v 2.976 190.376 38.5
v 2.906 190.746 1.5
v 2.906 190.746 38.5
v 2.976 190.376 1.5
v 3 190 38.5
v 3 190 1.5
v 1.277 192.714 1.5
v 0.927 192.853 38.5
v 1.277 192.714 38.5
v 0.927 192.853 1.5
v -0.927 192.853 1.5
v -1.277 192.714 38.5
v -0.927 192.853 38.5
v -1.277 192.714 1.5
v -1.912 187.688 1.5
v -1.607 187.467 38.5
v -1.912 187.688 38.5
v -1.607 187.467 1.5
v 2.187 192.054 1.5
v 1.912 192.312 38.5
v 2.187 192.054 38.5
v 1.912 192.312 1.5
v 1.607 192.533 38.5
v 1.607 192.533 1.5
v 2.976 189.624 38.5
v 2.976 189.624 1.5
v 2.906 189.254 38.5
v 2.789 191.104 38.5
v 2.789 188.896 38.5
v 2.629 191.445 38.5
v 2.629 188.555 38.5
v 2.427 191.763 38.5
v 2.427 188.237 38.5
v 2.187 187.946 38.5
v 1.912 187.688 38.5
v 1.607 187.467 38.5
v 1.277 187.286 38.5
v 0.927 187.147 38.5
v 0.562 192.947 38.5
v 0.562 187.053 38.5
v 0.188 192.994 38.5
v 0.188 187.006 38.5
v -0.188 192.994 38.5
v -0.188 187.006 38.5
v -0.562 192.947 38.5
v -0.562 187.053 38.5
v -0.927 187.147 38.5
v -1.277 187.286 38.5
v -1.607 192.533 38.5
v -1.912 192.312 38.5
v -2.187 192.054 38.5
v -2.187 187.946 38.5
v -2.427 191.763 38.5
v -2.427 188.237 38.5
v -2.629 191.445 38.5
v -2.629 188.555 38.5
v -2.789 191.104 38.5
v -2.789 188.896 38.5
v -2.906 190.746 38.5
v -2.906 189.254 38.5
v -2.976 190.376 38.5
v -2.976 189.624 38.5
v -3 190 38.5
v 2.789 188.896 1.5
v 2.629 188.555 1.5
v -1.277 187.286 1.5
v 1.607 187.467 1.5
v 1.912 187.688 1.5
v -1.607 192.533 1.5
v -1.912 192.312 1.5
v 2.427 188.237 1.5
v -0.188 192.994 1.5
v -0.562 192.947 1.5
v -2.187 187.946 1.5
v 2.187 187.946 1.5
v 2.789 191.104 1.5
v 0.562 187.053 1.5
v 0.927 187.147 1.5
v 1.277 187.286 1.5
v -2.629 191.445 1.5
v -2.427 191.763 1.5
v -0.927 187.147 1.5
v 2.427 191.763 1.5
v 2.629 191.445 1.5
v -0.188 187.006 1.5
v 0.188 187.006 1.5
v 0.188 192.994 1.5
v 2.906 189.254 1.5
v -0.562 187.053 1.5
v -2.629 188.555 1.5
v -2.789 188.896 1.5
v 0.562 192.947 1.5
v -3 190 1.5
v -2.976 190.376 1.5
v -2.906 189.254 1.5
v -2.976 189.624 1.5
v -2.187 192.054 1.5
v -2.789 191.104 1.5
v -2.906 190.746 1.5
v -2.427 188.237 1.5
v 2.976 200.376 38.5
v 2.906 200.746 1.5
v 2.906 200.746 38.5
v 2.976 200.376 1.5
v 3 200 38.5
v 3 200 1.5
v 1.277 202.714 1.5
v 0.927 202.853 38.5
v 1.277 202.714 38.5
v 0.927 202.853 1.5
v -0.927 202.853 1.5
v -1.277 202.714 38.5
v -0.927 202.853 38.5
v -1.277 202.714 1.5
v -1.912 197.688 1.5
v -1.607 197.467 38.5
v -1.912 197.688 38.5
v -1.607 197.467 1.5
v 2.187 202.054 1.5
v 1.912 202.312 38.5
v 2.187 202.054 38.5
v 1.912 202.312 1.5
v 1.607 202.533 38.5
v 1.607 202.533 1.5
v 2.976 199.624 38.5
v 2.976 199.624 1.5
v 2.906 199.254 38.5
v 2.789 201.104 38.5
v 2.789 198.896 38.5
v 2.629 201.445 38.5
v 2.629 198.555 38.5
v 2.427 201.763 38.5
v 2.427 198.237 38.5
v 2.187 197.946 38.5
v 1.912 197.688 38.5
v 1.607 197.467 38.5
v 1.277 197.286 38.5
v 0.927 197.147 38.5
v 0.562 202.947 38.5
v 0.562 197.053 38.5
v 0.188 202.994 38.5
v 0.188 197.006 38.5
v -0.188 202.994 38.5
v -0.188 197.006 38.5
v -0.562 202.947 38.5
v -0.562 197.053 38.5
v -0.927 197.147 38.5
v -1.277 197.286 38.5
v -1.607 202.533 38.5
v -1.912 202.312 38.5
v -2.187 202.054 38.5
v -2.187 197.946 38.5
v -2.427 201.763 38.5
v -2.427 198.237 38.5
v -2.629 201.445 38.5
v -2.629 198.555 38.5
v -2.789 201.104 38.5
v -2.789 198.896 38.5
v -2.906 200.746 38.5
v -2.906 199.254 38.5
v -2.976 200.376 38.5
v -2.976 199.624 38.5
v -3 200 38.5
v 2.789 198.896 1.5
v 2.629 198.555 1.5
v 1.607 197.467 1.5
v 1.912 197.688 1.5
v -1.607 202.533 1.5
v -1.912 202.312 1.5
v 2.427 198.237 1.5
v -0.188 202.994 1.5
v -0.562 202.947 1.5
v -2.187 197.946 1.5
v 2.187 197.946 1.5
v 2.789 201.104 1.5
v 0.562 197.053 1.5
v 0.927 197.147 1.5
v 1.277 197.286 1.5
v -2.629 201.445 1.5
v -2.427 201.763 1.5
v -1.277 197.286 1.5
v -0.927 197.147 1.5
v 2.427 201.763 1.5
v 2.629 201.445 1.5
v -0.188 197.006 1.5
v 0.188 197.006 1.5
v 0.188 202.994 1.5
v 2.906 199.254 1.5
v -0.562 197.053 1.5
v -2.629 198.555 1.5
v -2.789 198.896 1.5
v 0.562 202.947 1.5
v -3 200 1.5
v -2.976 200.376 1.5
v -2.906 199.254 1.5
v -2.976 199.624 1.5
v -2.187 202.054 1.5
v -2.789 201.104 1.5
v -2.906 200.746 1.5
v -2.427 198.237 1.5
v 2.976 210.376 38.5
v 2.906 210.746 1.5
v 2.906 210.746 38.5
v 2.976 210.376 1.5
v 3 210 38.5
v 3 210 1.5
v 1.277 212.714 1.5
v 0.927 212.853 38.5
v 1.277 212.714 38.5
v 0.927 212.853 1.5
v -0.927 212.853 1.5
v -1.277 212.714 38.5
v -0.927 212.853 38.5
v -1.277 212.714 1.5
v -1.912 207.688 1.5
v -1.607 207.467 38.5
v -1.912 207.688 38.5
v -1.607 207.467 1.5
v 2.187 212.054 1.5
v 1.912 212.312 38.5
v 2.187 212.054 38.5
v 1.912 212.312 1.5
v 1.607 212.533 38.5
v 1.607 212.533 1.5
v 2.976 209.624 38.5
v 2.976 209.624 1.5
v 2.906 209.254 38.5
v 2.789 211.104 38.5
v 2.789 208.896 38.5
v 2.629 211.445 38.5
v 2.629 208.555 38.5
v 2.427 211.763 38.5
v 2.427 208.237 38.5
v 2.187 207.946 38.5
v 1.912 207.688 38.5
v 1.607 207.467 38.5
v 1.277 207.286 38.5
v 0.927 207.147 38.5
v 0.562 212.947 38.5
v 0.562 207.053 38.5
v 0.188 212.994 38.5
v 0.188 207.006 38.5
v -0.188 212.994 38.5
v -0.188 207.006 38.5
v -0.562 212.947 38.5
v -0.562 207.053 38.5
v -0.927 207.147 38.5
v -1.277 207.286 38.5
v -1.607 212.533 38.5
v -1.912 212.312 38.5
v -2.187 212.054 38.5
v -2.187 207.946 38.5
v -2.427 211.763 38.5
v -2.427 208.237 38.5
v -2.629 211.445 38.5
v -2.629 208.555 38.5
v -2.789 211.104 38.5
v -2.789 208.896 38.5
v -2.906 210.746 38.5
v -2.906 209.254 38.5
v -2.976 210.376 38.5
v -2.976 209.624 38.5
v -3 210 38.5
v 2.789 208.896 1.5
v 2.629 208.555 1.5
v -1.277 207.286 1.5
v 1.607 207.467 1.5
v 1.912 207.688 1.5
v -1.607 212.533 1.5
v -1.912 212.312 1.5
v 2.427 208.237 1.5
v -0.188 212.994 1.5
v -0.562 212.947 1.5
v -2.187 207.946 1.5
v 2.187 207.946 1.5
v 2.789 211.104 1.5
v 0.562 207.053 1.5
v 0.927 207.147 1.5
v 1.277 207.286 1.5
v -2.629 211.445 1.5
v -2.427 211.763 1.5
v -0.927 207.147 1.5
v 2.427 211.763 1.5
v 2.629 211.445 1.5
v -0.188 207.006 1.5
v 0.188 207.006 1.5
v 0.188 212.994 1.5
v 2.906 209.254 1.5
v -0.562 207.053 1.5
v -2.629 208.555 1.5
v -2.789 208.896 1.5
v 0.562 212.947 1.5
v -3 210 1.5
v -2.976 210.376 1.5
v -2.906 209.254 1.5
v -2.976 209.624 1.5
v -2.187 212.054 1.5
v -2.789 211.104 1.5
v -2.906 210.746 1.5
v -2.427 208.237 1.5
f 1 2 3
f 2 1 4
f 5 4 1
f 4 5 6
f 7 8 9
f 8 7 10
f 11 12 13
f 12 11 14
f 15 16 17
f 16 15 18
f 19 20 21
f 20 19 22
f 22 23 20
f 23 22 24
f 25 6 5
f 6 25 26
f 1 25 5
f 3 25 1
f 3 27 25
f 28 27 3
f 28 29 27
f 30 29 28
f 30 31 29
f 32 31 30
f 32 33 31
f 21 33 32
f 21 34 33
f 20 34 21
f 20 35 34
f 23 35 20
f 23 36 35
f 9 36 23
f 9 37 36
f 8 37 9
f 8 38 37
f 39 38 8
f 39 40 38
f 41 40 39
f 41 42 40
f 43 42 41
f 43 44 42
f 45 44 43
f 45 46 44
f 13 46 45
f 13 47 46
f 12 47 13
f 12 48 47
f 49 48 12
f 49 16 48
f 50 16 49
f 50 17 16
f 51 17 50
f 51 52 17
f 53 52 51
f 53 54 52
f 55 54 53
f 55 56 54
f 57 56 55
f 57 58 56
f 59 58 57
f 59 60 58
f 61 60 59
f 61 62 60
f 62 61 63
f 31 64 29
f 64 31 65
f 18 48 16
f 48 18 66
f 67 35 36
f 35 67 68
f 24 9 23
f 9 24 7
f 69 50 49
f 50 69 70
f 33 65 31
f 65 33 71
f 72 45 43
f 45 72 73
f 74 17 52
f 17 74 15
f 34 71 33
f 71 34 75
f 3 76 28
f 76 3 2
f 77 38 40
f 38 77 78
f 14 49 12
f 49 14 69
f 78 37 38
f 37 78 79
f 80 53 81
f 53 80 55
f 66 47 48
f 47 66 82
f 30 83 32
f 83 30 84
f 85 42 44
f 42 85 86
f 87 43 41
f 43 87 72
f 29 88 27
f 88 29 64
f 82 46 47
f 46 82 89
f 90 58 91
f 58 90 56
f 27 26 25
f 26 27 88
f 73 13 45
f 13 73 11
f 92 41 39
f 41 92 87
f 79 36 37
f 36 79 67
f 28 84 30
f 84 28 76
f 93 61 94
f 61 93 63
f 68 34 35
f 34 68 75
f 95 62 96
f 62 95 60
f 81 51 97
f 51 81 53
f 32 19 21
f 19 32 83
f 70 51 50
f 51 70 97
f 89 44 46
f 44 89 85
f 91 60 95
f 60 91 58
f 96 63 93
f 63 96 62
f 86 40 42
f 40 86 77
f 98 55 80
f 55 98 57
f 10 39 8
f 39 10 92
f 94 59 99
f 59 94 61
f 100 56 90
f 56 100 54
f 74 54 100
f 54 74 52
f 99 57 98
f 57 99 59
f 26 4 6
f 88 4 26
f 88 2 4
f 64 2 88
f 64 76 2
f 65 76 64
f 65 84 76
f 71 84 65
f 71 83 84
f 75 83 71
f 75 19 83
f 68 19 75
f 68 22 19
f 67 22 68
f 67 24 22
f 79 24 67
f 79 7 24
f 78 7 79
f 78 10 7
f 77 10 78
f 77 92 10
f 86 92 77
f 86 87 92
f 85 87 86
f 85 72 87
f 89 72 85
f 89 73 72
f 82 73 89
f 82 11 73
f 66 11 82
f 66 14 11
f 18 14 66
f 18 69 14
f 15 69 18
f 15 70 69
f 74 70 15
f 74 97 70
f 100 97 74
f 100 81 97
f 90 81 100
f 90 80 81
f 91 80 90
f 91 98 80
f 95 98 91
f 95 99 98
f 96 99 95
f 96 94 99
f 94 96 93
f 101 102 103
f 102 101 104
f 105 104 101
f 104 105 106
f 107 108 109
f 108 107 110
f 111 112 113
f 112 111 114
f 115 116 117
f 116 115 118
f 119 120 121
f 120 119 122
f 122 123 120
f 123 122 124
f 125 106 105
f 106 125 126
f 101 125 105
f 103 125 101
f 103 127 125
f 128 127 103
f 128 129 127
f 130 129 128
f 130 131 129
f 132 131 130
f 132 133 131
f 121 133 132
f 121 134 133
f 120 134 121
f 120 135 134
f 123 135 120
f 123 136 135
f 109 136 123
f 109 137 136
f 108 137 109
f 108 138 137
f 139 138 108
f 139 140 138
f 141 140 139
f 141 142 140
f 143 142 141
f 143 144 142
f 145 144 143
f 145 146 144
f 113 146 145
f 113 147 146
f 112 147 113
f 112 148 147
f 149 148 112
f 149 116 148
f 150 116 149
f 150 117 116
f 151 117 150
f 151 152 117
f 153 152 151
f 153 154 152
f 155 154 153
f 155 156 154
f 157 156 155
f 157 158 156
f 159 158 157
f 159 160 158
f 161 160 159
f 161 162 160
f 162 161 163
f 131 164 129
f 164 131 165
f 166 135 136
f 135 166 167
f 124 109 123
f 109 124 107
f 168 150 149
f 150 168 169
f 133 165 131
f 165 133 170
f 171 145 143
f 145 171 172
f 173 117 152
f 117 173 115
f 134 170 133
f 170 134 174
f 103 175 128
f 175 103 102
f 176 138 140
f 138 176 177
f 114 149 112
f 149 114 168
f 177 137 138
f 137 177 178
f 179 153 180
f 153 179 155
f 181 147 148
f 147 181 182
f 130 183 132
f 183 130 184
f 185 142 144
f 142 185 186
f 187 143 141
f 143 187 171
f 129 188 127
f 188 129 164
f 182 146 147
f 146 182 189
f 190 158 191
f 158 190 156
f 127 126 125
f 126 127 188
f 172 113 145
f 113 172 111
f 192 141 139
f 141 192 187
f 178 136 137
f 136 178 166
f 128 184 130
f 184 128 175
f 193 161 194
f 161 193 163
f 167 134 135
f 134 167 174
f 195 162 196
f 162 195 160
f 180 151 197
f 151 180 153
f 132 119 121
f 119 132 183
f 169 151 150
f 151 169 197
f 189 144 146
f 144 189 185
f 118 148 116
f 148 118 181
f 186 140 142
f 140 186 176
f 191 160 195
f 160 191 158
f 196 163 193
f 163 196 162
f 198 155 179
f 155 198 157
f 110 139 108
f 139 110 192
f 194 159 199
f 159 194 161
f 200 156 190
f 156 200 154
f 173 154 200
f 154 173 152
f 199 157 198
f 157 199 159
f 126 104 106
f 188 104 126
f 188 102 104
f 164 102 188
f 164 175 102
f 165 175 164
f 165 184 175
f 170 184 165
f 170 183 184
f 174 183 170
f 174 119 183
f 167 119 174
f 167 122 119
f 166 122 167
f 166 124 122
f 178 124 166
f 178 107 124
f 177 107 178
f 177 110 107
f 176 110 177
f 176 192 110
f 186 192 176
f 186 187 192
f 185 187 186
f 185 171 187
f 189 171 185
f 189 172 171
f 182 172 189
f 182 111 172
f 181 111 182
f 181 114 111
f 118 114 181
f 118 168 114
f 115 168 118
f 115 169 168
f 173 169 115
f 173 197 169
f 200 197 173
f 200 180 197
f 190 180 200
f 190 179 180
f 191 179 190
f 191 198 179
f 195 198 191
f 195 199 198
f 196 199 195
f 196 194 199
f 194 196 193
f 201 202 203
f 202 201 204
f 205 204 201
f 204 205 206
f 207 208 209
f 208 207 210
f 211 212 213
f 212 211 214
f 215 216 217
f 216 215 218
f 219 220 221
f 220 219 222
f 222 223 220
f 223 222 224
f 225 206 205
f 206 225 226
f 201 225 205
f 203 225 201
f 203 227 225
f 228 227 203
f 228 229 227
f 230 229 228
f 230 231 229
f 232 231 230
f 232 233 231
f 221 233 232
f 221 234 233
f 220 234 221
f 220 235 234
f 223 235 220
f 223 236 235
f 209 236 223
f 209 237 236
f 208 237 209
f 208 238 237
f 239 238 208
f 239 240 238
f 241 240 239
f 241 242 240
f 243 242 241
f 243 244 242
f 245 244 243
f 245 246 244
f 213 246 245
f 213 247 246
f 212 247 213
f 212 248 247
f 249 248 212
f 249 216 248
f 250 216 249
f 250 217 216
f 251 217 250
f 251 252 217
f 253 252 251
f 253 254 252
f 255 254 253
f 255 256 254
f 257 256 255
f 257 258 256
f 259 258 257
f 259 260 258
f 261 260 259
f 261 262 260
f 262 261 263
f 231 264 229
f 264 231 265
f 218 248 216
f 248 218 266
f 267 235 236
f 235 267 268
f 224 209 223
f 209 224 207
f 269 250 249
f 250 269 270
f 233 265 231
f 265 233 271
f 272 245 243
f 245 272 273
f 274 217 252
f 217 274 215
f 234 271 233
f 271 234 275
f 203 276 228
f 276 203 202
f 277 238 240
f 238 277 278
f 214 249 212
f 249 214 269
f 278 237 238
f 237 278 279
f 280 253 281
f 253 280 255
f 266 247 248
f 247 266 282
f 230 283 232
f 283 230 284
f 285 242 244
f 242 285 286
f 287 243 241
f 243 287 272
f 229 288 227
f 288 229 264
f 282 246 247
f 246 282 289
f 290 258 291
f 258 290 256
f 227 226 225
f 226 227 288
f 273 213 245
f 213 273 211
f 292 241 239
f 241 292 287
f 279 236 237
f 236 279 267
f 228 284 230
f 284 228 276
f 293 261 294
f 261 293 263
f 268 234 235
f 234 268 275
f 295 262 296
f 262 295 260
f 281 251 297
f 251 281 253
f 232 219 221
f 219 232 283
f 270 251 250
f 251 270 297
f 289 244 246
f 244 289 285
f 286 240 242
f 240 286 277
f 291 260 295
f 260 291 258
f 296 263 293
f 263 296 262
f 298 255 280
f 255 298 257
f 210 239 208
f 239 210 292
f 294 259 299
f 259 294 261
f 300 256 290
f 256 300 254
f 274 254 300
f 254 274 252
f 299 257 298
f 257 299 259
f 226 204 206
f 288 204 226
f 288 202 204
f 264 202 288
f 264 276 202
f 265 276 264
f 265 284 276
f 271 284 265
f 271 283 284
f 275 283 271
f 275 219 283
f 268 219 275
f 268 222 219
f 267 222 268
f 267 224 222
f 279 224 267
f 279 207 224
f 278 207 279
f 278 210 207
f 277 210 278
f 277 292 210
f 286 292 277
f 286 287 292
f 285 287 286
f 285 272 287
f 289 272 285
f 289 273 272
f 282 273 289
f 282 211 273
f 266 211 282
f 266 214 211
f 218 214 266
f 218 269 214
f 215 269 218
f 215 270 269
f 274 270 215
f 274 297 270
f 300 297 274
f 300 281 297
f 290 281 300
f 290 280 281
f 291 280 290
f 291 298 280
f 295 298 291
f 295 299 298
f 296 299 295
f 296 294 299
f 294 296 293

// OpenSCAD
/* wrist.scad
Author: andimoto@posteo.de
----------------------------
for placing assambled parts and
single parts go to end of this file

set the form of the wrist rest in "wristForm" array
 */

$fn=50;

wristLength = 306;
edgeRadius = 1;

connectorRadius=3;
connectorLen=40;

wristForm=[
  [0,0],
  [80,0],
  [80,5],
  [78.2,8.2],
  [75,10],
  [40,16],
  [0,16]
];



module connector(rad,conLength)
{
  cylinder(r=rad, h=conLength, center=true);
}

module wristProfile(form)
{
  polygon(form);
}

module wrist(length=360)
{
  translate([edgeRadius,edgeRadius,edgeRadius])
  rotate([90,0,90])
  minkowski()
  {
    union()
    {
      linear_extrude(length-edgeRadius*2)
      wristProfile(wristForm);
    }
    /* rotate([0,90,0]) cylinder(r=edgeRadius, h=1, center=true); */
    sphere(r=edgeRadius);
  }
}

module wristRestLeft(length)
{
  difference() {
    wrist(length);
    translate([0,-1,0]) rotate([90,0,90]) linear_extrude(length/2)
    scale([1.1,1.2,1]) wristProfile(wristForm);
    translate([length/2,10,6]) rotate([0,90,0]) connector(connectorRadius+0.2,connectorLen);
    translate([length/2,40,6]) rotate([0,90,0]) connector(connectorRadius+0.2,connectorLen);
    translate([length/2,70,6]) rotate([0,90,0]) connector(connectorRadius+0.2,connectorLen);
  }
}

module wristRestRight(length=360)
{
  difference() {
    wrist(length);
    translate([length/2,-1,0]) rotate([90,0,90]) linear_extrude(length/2)
    scale([1.1,1.2,1]) wristProfile(wristForm);
    translate([length/2,10,6]) rotate([0,90,0]) connector(connectorRadius+0.2,connectorLen);
    translate([length/2,40,6]) rotate([0,90,0]) connector(connectorRadius+0.2,connectorLen);
    translate([length/2,70,6]) rotate([0,90,0]) connector(connectorRadius+0.2,connectorLen);
  }
}


translate([0,150+connectorLen,connectorLen/2]) connector(connectorRadius-0.0,connectorLen-3);
translate([0,150+connectorLen+10,connectorLen/2]) connector(connectorRadius-0.0,connectorLen-3);
translate([0,150+connectorLen+20,connectorLen/2]) connector(connectorRadius-0.0,connectorLen-3);
/* wristProfile(wristForm); */
/* wrist(wristLength); */
/* translate([0,100,0]) wristRestRight(wristLength); */
/* translate([20,100,0]) wristRestLeft(wristLength); */
